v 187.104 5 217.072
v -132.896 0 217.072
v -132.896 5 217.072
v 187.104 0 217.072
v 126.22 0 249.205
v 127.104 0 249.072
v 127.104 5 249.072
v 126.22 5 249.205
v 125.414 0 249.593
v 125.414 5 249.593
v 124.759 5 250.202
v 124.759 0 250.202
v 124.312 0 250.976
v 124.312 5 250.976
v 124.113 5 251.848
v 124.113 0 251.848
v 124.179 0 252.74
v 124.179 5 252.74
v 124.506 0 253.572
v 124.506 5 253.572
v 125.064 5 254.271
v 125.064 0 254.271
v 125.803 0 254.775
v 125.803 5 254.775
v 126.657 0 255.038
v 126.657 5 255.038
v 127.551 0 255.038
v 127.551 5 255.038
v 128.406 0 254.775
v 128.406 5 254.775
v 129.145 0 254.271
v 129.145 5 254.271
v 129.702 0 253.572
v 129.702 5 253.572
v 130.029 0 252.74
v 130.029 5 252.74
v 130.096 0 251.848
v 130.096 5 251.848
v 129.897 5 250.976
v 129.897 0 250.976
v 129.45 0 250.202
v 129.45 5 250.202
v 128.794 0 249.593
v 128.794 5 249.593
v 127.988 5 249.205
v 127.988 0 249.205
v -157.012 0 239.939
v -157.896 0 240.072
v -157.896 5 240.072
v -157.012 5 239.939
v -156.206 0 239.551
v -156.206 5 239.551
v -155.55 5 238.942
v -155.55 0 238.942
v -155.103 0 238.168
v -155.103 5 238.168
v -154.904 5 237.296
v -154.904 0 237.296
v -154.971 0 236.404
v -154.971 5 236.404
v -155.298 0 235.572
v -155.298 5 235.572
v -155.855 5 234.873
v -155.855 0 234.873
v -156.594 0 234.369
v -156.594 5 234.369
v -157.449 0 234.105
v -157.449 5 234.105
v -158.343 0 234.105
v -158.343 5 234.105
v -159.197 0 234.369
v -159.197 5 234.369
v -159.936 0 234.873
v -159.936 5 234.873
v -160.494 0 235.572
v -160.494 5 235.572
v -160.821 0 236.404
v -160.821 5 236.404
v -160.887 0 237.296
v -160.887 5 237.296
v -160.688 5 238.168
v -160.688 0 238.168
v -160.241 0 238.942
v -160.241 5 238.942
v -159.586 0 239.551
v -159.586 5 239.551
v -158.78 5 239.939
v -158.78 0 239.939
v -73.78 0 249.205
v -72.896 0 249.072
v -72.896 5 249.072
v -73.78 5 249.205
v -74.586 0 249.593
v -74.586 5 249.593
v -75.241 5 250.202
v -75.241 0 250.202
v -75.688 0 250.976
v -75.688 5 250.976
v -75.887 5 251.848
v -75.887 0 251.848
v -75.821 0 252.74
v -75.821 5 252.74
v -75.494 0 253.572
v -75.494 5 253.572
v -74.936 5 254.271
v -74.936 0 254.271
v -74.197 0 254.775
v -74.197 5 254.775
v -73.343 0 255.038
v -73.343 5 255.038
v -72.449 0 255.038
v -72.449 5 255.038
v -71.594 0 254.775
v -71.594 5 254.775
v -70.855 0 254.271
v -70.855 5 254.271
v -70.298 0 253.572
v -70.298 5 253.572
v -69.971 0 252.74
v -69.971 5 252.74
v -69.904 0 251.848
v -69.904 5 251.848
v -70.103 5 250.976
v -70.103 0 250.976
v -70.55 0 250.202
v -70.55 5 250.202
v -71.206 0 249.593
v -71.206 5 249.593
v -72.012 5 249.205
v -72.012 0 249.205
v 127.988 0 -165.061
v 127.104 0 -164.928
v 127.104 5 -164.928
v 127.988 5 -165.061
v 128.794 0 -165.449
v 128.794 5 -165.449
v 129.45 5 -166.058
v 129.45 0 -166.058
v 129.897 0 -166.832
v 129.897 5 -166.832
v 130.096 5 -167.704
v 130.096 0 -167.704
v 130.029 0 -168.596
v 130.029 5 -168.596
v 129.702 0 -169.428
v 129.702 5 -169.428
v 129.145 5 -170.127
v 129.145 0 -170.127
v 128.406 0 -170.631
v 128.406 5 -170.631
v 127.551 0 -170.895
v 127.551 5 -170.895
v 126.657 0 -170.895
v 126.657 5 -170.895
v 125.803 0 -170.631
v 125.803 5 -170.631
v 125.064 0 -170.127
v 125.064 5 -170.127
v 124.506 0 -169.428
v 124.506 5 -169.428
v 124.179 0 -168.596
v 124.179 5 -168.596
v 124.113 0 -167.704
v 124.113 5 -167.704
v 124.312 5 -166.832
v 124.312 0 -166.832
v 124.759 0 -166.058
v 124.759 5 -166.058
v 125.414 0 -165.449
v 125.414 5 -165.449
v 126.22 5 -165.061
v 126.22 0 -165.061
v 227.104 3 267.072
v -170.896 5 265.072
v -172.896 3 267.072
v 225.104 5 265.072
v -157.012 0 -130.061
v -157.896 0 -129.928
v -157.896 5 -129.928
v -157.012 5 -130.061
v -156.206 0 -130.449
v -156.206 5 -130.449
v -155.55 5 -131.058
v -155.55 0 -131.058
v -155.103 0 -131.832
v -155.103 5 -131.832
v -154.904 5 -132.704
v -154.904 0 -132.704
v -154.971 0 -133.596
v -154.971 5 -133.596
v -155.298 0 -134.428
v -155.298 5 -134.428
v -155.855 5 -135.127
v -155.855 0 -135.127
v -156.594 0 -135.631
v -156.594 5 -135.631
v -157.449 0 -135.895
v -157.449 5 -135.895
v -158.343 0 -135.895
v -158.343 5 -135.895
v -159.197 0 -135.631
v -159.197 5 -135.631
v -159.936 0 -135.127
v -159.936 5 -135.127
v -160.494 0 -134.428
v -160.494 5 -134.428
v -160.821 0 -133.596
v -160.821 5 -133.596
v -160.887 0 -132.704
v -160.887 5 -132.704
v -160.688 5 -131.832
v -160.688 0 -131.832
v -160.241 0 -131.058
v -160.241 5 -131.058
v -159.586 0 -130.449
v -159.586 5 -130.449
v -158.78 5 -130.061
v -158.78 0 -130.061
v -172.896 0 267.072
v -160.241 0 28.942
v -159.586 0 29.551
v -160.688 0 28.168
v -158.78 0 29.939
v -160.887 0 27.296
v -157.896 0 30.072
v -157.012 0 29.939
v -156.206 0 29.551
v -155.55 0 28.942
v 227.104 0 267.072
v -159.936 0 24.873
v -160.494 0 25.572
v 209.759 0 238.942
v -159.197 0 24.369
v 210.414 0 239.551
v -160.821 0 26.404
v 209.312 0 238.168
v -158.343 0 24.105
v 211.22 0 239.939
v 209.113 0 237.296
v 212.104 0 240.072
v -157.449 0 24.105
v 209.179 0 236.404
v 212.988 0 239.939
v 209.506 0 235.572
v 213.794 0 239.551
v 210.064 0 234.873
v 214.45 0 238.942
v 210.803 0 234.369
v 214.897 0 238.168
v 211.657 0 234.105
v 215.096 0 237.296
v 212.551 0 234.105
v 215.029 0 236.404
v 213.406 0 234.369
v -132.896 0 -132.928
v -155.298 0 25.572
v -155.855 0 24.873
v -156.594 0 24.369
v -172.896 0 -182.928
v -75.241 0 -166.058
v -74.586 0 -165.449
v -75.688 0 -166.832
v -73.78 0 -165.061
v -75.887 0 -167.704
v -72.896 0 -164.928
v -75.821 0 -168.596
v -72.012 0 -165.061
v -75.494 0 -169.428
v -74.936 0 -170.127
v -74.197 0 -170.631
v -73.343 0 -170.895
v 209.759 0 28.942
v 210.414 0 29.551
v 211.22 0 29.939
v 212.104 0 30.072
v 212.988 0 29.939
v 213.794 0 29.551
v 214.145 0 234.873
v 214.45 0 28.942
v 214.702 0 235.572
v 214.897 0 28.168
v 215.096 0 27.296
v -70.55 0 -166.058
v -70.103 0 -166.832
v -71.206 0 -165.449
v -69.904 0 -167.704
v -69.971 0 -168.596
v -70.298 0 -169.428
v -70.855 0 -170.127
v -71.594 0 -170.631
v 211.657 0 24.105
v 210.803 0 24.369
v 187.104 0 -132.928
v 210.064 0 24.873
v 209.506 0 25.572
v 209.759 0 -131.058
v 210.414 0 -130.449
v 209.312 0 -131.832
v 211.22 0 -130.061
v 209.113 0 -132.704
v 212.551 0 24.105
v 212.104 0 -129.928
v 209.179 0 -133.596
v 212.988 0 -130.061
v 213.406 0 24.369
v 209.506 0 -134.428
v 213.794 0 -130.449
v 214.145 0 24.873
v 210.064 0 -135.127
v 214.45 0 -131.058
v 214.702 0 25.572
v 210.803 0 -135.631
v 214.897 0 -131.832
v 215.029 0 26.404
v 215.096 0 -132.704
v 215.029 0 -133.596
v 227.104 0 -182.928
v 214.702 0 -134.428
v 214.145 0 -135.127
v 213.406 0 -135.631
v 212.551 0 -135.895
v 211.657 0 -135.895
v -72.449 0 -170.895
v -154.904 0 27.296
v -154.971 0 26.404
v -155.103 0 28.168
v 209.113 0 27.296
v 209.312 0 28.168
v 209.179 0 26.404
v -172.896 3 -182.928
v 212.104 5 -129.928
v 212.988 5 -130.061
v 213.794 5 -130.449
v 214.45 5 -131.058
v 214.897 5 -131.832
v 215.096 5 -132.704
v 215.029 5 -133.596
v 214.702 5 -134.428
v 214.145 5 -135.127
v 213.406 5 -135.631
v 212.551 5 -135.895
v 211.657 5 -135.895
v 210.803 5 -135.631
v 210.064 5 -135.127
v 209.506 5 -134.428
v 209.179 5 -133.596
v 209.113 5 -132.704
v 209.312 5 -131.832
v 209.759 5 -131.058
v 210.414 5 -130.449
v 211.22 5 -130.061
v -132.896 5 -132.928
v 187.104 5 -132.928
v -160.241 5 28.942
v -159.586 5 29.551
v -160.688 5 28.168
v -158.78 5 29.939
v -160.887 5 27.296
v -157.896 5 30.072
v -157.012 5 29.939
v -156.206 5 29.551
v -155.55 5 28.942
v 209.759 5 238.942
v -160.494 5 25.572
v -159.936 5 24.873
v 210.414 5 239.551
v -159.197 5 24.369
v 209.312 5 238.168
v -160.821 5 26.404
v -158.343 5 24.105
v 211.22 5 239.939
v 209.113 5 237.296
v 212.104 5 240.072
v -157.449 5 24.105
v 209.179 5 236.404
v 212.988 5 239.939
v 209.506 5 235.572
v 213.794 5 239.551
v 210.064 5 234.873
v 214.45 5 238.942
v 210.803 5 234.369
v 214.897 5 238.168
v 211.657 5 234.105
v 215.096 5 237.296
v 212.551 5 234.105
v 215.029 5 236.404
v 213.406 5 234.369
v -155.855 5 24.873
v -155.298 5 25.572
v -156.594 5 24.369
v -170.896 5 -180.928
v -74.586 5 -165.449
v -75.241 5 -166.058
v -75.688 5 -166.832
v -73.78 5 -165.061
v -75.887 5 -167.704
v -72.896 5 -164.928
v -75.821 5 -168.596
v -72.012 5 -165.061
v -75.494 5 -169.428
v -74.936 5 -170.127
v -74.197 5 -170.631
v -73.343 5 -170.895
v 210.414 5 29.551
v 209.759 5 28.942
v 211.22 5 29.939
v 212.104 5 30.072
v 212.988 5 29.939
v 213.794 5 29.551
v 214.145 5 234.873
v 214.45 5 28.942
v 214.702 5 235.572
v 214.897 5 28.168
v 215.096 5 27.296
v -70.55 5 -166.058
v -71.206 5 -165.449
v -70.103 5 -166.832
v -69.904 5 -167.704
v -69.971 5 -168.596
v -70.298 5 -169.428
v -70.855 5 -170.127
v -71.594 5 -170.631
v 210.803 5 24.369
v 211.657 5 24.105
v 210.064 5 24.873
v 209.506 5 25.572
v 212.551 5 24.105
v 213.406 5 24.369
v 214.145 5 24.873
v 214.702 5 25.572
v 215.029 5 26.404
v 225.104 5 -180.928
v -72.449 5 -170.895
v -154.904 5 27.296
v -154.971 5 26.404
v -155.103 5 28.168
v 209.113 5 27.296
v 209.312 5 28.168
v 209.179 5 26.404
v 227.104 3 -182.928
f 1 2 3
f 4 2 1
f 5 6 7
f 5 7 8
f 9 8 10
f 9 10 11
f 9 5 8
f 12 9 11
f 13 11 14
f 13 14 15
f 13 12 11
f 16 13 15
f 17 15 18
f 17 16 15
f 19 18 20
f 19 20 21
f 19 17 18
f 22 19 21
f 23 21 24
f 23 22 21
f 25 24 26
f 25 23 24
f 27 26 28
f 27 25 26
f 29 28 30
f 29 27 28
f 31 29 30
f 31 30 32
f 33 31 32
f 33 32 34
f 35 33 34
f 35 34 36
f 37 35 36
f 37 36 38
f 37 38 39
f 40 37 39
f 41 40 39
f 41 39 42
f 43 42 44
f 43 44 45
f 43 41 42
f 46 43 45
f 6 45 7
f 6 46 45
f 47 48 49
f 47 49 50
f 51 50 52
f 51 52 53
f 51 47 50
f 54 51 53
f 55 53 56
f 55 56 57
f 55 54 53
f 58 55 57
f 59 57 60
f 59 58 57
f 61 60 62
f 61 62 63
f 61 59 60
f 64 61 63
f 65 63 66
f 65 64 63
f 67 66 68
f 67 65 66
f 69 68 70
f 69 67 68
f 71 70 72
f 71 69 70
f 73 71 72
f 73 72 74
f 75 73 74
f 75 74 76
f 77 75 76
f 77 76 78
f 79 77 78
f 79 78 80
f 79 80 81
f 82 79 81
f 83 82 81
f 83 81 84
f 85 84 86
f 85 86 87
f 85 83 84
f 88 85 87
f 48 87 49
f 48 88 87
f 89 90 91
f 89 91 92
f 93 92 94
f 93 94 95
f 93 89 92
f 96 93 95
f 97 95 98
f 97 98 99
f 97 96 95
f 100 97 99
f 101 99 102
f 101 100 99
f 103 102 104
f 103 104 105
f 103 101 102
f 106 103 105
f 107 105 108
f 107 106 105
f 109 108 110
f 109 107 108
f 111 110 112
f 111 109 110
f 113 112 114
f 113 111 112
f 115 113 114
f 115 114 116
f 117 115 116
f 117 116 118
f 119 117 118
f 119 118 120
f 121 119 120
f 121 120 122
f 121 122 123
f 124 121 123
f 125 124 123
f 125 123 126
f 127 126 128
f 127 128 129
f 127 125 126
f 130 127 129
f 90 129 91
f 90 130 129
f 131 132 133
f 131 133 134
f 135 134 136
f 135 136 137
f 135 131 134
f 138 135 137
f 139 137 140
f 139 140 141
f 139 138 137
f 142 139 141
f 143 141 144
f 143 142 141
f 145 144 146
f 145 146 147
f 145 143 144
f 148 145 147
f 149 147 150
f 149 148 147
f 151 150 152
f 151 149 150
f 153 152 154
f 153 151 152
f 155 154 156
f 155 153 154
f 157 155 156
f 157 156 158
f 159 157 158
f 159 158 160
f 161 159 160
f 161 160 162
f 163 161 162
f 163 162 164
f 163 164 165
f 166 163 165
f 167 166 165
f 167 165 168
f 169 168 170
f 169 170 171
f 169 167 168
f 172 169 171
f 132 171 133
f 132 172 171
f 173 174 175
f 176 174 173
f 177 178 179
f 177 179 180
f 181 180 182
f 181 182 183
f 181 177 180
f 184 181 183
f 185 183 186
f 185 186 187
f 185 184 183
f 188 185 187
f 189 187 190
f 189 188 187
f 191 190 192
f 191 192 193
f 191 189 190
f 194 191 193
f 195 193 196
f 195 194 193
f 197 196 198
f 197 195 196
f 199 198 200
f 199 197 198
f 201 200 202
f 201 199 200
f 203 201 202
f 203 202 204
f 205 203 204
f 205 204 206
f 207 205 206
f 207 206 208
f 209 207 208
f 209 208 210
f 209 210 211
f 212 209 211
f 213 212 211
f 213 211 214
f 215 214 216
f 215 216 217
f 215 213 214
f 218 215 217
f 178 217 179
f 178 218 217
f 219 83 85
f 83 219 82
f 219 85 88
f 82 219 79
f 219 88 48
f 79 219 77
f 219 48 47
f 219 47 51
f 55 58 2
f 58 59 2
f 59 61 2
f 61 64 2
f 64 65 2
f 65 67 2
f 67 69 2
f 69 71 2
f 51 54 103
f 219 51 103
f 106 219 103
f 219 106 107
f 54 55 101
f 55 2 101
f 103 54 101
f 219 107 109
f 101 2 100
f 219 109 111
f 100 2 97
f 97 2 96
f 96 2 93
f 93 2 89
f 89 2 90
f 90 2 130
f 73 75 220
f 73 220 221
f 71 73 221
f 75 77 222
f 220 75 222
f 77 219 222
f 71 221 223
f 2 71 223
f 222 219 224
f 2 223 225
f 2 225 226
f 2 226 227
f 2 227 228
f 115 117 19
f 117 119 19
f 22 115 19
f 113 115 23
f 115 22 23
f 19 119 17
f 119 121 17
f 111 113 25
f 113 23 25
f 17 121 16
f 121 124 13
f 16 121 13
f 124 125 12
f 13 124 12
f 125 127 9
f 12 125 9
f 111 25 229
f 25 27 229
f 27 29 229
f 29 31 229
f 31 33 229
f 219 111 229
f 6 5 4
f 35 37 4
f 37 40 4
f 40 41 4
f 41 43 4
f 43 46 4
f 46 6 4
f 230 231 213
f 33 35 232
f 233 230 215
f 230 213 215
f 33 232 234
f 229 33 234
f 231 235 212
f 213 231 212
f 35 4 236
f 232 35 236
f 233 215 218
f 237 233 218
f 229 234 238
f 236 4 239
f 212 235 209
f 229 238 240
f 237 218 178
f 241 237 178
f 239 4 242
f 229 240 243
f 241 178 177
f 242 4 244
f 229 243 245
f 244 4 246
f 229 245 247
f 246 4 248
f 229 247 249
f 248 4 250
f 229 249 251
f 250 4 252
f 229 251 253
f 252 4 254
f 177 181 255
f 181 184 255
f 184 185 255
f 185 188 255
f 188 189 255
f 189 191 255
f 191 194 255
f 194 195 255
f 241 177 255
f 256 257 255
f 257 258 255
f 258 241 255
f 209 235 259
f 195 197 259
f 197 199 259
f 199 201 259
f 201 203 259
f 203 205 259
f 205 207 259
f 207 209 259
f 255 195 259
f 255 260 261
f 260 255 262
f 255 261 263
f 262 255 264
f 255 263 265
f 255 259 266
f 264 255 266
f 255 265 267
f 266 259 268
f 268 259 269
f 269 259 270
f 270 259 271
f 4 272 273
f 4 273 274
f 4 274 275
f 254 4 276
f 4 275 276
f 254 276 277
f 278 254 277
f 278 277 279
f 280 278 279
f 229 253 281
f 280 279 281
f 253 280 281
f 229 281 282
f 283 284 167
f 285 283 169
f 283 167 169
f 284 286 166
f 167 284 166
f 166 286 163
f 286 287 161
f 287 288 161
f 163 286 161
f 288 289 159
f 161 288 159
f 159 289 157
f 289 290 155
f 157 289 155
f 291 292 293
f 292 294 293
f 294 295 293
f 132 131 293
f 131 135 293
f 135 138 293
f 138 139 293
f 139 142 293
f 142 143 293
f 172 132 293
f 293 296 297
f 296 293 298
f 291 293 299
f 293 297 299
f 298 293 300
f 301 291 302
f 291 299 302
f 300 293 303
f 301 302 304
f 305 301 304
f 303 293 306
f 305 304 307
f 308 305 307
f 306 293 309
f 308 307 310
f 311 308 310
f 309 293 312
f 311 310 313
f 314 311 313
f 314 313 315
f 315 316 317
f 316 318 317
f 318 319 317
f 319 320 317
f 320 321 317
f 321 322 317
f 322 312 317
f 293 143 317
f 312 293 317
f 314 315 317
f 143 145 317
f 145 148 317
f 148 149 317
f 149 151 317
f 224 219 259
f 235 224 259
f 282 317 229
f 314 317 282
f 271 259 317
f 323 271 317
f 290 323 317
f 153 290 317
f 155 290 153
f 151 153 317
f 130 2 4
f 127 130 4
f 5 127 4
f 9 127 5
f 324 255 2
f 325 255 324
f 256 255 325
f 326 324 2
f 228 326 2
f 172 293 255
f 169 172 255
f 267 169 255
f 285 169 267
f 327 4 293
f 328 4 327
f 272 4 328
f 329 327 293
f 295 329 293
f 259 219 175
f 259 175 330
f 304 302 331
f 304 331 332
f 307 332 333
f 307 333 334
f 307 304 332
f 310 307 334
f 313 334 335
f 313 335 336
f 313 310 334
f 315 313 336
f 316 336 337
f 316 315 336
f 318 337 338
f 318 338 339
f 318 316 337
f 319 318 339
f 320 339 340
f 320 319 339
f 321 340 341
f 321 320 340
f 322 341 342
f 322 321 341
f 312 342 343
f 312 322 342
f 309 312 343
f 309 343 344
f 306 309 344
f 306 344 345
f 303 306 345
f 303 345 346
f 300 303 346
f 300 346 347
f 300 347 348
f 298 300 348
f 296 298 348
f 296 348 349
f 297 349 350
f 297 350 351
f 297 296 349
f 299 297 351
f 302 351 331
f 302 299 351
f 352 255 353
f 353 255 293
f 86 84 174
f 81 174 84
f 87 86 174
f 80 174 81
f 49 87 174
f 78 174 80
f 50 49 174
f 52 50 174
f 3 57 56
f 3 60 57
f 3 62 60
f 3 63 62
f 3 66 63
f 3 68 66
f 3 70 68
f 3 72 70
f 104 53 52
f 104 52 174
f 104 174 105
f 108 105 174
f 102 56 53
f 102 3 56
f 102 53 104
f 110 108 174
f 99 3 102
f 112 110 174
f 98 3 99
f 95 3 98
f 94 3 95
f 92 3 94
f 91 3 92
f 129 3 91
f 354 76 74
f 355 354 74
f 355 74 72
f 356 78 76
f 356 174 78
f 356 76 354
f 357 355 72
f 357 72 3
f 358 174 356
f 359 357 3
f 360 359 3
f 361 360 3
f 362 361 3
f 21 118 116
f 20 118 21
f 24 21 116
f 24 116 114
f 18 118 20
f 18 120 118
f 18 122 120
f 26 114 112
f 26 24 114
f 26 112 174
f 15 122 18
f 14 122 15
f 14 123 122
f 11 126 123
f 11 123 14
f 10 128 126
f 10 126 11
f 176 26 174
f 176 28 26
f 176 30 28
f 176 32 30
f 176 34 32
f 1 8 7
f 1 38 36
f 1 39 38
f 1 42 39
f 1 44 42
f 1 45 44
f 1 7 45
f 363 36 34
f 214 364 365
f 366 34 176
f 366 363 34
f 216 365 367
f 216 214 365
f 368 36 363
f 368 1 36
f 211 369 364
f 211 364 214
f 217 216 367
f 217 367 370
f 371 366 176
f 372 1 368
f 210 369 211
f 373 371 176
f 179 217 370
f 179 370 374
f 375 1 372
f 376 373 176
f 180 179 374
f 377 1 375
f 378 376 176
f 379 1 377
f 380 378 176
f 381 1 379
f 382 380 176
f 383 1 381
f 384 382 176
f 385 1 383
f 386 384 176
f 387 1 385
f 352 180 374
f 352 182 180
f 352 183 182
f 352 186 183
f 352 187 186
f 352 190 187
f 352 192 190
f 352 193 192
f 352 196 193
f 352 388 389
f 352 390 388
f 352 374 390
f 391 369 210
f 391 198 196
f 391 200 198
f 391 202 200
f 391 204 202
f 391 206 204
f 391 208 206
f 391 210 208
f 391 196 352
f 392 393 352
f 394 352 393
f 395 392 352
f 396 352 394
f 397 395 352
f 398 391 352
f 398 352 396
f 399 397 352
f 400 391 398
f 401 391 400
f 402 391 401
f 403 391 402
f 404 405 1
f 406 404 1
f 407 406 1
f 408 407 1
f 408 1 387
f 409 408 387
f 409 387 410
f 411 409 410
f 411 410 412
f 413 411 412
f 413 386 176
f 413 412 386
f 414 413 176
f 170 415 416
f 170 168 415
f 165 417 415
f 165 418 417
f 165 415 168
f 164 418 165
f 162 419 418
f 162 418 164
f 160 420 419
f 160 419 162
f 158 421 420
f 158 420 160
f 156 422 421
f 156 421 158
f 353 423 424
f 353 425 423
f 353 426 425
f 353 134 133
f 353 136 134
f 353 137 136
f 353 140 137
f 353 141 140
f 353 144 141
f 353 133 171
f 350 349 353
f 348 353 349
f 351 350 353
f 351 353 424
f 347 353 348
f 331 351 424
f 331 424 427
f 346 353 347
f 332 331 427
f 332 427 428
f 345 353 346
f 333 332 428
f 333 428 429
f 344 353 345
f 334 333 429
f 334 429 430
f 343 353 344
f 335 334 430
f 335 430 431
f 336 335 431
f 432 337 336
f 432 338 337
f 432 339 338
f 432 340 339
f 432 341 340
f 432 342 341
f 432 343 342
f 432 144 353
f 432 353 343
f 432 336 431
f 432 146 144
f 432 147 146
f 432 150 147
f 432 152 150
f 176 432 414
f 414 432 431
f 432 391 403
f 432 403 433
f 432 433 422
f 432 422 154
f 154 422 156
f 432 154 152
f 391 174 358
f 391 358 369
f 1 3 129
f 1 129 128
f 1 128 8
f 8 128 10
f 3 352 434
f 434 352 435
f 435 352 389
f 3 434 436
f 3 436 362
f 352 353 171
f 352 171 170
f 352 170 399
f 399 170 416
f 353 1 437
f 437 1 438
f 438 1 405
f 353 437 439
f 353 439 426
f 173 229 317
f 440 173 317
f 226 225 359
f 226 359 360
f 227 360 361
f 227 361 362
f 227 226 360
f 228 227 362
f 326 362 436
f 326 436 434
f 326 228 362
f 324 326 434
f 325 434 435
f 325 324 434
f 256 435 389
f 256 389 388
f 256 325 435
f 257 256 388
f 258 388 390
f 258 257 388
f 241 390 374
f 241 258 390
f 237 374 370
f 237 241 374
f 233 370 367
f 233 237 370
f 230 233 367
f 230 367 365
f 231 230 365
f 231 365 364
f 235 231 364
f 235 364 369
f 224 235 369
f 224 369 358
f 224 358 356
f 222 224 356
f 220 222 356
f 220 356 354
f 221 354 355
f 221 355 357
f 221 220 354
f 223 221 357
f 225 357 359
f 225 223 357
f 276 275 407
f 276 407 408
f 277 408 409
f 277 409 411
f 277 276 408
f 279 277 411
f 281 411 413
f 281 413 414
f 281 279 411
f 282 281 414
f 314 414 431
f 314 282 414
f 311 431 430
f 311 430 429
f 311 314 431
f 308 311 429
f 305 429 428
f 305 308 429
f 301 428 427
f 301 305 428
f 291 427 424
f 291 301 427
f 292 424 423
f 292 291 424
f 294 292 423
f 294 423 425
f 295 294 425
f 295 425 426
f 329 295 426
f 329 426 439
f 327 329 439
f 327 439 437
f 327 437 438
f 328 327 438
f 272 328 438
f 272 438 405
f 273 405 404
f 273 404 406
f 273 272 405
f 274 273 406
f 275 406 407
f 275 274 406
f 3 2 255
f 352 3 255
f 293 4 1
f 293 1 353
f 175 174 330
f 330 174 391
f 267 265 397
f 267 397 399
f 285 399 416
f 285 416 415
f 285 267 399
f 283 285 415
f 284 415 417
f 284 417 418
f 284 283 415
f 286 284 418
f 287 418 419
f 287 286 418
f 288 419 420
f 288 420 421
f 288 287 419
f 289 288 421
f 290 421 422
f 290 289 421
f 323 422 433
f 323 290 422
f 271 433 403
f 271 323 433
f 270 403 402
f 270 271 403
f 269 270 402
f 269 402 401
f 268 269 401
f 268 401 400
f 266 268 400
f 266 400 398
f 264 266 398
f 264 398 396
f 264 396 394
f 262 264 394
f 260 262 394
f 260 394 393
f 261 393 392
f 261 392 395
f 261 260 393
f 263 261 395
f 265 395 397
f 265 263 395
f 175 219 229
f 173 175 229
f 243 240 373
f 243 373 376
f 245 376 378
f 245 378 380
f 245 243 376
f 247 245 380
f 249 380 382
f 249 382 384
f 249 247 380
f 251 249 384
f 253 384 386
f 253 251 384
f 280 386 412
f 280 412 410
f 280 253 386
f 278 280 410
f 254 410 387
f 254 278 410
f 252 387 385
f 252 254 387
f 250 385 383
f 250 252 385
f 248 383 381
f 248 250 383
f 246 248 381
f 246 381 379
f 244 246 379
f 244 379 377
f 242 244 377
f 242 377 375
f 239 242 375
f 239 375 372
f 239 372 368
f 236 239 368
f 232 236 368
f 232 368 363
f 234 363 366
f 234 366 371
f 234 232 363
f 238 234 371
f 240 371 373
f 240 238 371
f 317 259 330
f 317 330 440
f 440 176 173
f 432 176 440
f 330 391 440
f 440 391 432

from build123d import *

# Parameters (mm, degrees)
CROQUIS1_W              = 400
CROQUIS1_H              = 450
CROQUIS1_R              = 3
CROQUIS1_W_2            = 320
CROQUIS1_H_2            = 350
SALIENTE_EXTRUIR1_DEPTH = 5
CHAFL_N1_SIZE           = 2


with BuildPart() as part:
    # Croquis1 → Saliente-Extruir1 (new body)
    with BuildSketch(Plane(origin=(0, 0, 0), x_dir=(1, 0, 0), z_dir=(0, 1, 0))):
        with Locations((27.104186234, -42.071984436)):
            Rectangle(CROQUIS1_W, CROQUIS1_H)
        with Locations(Location((-157.895813766, 132.928015564, 0), (0, 0, 270))):
            Circle(CROQUIS1_R, mode=Mode.SUBTRACT)
        with Locations(Location((-157.895813766, -237.071984436, 0), (0, 0, 270))):
            Circle(CROQUIS1_R, mode=Mode.SUBTRACT)
        with Locations(Location((212.104186234, -237.071984436, 0), (0, 0, 270))):
            Circle(CROQUIS1_R, mode=Mode.SUBTRACT)
        with Locations(Location((212.104186234, 132.928015564, 0), (0, 0, 270))):
            Circle(CROQUIS1_R, mode=Mode.SUBTRACT)
        with Locations(Location((-157.895813766, -27.071984436, 0), (0, 0, 270))):
            Circle(CROQUIS1_R, mode=Mode.SUBTRACT)
        with Locations(Location((212.104186234, -27.071984436, 0), (0, 0, 270))):
            Circle(CROQUIS1_R, mode=Mode.SUBTRACT)
        with Locations(Location((-72.895813766, 167.928015564, 0), (0, 0, 270))):
            Circle(CROQUIS1_R, mode=Mode.SUBTRACT)
        with Locations(Location((127.104186234, 167.928015564, 0), (0, 0, 270))):
            Circle(CROQUIS1_R, mode=Mode.SUBTRACT)
        with Locations(Location((127.104186234, -252.071984436, 0), (0, 0, 90))):
            Circle(CROQUIS1_R, mode=Mode.SUBTRACT)
        with Locations(Location((-72.895813766, -252.071984436, 0), (0, 0, 90))):
            Circle(CROQUIS1_R, mode=Mode.SUBTRACT)
        with Locations((27.104186234, -42.071984436)):
            Rectangle(CROQUIS1_W_2, CROQUIS1_H_2, mode=Mode.SUBTRACT)
    extrude(amount=SALIENTE_EXTRUIR1_DEPTH)

    # Chaflán1
    chafl_n1_edges = [part.edges().sort_by_distance(p)[0] for p in [
        (227.104186234, 5, 42.071984436),
        (27.104186234, 5, -182.928015564),
        (-172.895813766, 5, 42.071984436),
        (27.104186234, 5, 267.071984436),
    ]]
    chamfer(chafl_n1_edges, length=CHAFL_N1_SIZE)


solid = part.part
